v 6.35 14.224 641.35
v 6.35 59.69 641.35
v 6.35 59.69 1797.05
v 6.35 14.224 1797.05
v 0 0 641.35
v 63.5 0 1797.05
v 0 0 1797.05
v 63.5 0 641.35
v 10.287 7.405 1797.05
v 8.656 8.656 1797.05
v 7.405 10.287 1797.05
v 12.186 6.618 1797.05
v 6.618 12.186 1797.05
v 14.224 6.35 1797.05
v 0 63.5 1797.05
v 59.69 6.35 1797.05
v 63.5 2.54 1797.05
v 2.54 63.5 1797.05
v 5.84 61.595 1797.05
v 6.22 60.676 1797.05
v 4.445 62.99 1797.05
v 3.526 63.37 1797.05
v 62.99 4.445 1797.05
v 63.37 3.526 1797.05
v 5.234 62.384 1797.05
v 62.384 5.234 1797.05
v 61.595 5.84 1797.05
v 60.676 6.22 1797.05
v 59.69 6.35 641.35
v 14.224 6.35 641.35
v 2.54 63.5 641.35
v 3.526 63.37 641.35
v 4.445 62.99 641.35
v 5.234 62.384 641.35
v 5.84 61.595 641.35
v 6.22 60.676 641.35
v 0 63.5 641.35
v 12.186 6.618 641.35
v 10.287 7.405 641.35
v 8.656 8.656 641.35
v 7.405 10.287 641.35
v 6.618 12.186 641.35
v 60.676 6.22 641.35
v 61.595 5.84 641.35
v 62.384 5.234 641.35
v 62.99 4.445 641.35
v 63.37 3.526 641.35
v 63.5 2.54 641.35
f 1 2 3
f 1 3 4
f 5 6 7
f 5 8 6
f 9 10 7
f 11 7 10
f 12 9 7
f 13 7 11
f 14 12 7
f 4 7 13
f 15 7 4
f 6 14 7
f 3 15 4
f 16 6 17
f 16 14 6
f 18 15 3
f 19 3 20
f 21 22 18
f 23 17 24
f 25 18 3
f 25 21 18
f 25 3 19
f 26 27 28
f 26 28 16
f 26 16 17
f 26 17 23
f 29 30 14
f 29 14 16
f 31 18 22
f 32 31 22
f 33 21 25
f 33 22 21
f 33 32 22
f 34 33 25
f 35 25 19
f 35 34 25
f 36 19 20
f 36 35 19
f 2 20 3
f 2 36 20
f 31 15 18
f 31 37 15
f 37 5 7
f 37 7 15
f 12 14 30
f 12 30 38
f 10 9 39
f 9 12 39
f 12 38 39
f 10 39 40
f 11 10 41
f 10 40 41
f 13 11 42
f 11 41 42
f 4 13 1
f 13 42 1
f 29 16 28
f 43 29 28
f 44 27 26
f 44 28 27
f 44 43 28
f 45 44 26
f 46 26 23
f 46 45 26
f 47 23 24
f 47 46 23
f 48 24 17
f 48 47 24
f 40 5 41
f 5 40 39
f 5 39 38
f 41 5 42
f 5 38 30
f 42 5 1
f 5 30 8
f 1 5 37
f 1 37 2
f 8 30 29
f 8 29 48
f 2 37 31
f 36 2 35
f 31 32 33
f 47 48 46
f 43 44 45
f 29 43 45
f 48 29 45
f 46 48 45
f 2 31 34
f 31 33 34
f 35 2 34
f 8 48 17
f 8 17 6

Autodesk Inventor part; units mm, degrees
ref_plane "YZ Plane" through (0, 0, 0) normal (1, 0, 0) x (0, 1, 0)
ref_plane "Start plane" through (0, 0, 641.35) normal (0, 0, 1) x (1, 0, 0)
ref_plane "End plane" through (0, 0, 1797.05) normal (0, 0, 1) x (1, 0, 0)
sketch "Sketch" plane through (0, 0, 0) normal (0, 0, 1) x (1, 0, 0)
  line L0 (63.5, 0) -> (0, 0)
  line L1 (0, 0) -> (0, 63.5)
  line L2 (0, 63.5) -> (2.54, 63.5)
  line L3 (6.35, 59.69) -> (6.35, 14.224)
  line L4 (14.224, 6.35) -> (59.69, 6.35)
  line L5 (63.5, 2.54) -> (63.5, 0)
  line L6 (0, -11.0414) -> (0, 31.5385) construction
  line L7 (-11.0414, 0) -> (31.5385, 0) construction
  arc A0 (6.35, 14.224) -> (14.224, 6.35) centre (14.224, 14.224) ccw
  arc A1 (6.35, 59.69) -> (2.54, 63.5) centre (2.54, 59.69) ccw
  arc A2 (63.5, 2.54) -> (59.69, 6.35) centre (59.69, 2.54) ccw
  line L8 (0, 79.3552) -> (0, -26.1075) construction
  line L9 (-26.1075, 0) -> (79.3552, 0) construction
  point P0 (6.35, 63.5)
  point P1 (6.35, 6.35)
  point P2 (63.5, 6.35)
  dimension "d0" = 63.5
  dimension "d1" = 63.5
  dimension "d2" = 6.35
  dimension "d3" = 6.35
  dimension "d10" = 0
  dimension "d11" = 0
  dimension "d14" = 7.874
  dimension "d15" = 3.81
extrude "Body" add sketch "Sketch" along normal up to surface (1155.7 mm away) from surface at 641.35
sketch "Sketch3" plane through (0, 0, 0) normal (0, 0, 1) x (1, 0, 0)
  line L0 (0, 0) -> (10, 0)
ref_plane "Work Plane3" through (0, 0, 0) normal (0, -1, 0) x (1, 0, 0)
sketch "Sketch4" plane through (0, 0, 0) normal (0, -1, 0) x (1, 0, 0)
  line L0 (-2, 641.35) -> (12, 641.35)
  line L1 (-2, 1797.05) -> (12, 1797.05)
  dimension "d17" = 1155.7
equation "\"d0\" = G_H"
equation "\"d1\" = G_H"
equation "\"d2\" = G_T"
equation "\"d3\" = G_T"
equation "\"d14\" = G_IR"
equation "\"d15\" = G_ER"
equation "\"d4\" = G_L"
equation "\"G_H\" = 63.5"
equation "\"G_T\" = 6.35"
equation "\"G_ER\" = 3.81"
equation "\"G_IR\" = 7.874"
equation "\"G_L\" = d17"
equation "\"ex\" = 0"
equation "\"G_OFFSET_START\" = -641.35"
equation "\"G_OFFSET_END\" = -641.35"
equation "\"d12\" = -G_OFFSET_START"
equation "\"d13\" = G_OFFSET_END + B_L"
equation "\"B_L\" = 2438.4"
properties part number "AISC - L 2.5 x 2.5 x 1/4 - 45.5" material "Steel, Mild"
